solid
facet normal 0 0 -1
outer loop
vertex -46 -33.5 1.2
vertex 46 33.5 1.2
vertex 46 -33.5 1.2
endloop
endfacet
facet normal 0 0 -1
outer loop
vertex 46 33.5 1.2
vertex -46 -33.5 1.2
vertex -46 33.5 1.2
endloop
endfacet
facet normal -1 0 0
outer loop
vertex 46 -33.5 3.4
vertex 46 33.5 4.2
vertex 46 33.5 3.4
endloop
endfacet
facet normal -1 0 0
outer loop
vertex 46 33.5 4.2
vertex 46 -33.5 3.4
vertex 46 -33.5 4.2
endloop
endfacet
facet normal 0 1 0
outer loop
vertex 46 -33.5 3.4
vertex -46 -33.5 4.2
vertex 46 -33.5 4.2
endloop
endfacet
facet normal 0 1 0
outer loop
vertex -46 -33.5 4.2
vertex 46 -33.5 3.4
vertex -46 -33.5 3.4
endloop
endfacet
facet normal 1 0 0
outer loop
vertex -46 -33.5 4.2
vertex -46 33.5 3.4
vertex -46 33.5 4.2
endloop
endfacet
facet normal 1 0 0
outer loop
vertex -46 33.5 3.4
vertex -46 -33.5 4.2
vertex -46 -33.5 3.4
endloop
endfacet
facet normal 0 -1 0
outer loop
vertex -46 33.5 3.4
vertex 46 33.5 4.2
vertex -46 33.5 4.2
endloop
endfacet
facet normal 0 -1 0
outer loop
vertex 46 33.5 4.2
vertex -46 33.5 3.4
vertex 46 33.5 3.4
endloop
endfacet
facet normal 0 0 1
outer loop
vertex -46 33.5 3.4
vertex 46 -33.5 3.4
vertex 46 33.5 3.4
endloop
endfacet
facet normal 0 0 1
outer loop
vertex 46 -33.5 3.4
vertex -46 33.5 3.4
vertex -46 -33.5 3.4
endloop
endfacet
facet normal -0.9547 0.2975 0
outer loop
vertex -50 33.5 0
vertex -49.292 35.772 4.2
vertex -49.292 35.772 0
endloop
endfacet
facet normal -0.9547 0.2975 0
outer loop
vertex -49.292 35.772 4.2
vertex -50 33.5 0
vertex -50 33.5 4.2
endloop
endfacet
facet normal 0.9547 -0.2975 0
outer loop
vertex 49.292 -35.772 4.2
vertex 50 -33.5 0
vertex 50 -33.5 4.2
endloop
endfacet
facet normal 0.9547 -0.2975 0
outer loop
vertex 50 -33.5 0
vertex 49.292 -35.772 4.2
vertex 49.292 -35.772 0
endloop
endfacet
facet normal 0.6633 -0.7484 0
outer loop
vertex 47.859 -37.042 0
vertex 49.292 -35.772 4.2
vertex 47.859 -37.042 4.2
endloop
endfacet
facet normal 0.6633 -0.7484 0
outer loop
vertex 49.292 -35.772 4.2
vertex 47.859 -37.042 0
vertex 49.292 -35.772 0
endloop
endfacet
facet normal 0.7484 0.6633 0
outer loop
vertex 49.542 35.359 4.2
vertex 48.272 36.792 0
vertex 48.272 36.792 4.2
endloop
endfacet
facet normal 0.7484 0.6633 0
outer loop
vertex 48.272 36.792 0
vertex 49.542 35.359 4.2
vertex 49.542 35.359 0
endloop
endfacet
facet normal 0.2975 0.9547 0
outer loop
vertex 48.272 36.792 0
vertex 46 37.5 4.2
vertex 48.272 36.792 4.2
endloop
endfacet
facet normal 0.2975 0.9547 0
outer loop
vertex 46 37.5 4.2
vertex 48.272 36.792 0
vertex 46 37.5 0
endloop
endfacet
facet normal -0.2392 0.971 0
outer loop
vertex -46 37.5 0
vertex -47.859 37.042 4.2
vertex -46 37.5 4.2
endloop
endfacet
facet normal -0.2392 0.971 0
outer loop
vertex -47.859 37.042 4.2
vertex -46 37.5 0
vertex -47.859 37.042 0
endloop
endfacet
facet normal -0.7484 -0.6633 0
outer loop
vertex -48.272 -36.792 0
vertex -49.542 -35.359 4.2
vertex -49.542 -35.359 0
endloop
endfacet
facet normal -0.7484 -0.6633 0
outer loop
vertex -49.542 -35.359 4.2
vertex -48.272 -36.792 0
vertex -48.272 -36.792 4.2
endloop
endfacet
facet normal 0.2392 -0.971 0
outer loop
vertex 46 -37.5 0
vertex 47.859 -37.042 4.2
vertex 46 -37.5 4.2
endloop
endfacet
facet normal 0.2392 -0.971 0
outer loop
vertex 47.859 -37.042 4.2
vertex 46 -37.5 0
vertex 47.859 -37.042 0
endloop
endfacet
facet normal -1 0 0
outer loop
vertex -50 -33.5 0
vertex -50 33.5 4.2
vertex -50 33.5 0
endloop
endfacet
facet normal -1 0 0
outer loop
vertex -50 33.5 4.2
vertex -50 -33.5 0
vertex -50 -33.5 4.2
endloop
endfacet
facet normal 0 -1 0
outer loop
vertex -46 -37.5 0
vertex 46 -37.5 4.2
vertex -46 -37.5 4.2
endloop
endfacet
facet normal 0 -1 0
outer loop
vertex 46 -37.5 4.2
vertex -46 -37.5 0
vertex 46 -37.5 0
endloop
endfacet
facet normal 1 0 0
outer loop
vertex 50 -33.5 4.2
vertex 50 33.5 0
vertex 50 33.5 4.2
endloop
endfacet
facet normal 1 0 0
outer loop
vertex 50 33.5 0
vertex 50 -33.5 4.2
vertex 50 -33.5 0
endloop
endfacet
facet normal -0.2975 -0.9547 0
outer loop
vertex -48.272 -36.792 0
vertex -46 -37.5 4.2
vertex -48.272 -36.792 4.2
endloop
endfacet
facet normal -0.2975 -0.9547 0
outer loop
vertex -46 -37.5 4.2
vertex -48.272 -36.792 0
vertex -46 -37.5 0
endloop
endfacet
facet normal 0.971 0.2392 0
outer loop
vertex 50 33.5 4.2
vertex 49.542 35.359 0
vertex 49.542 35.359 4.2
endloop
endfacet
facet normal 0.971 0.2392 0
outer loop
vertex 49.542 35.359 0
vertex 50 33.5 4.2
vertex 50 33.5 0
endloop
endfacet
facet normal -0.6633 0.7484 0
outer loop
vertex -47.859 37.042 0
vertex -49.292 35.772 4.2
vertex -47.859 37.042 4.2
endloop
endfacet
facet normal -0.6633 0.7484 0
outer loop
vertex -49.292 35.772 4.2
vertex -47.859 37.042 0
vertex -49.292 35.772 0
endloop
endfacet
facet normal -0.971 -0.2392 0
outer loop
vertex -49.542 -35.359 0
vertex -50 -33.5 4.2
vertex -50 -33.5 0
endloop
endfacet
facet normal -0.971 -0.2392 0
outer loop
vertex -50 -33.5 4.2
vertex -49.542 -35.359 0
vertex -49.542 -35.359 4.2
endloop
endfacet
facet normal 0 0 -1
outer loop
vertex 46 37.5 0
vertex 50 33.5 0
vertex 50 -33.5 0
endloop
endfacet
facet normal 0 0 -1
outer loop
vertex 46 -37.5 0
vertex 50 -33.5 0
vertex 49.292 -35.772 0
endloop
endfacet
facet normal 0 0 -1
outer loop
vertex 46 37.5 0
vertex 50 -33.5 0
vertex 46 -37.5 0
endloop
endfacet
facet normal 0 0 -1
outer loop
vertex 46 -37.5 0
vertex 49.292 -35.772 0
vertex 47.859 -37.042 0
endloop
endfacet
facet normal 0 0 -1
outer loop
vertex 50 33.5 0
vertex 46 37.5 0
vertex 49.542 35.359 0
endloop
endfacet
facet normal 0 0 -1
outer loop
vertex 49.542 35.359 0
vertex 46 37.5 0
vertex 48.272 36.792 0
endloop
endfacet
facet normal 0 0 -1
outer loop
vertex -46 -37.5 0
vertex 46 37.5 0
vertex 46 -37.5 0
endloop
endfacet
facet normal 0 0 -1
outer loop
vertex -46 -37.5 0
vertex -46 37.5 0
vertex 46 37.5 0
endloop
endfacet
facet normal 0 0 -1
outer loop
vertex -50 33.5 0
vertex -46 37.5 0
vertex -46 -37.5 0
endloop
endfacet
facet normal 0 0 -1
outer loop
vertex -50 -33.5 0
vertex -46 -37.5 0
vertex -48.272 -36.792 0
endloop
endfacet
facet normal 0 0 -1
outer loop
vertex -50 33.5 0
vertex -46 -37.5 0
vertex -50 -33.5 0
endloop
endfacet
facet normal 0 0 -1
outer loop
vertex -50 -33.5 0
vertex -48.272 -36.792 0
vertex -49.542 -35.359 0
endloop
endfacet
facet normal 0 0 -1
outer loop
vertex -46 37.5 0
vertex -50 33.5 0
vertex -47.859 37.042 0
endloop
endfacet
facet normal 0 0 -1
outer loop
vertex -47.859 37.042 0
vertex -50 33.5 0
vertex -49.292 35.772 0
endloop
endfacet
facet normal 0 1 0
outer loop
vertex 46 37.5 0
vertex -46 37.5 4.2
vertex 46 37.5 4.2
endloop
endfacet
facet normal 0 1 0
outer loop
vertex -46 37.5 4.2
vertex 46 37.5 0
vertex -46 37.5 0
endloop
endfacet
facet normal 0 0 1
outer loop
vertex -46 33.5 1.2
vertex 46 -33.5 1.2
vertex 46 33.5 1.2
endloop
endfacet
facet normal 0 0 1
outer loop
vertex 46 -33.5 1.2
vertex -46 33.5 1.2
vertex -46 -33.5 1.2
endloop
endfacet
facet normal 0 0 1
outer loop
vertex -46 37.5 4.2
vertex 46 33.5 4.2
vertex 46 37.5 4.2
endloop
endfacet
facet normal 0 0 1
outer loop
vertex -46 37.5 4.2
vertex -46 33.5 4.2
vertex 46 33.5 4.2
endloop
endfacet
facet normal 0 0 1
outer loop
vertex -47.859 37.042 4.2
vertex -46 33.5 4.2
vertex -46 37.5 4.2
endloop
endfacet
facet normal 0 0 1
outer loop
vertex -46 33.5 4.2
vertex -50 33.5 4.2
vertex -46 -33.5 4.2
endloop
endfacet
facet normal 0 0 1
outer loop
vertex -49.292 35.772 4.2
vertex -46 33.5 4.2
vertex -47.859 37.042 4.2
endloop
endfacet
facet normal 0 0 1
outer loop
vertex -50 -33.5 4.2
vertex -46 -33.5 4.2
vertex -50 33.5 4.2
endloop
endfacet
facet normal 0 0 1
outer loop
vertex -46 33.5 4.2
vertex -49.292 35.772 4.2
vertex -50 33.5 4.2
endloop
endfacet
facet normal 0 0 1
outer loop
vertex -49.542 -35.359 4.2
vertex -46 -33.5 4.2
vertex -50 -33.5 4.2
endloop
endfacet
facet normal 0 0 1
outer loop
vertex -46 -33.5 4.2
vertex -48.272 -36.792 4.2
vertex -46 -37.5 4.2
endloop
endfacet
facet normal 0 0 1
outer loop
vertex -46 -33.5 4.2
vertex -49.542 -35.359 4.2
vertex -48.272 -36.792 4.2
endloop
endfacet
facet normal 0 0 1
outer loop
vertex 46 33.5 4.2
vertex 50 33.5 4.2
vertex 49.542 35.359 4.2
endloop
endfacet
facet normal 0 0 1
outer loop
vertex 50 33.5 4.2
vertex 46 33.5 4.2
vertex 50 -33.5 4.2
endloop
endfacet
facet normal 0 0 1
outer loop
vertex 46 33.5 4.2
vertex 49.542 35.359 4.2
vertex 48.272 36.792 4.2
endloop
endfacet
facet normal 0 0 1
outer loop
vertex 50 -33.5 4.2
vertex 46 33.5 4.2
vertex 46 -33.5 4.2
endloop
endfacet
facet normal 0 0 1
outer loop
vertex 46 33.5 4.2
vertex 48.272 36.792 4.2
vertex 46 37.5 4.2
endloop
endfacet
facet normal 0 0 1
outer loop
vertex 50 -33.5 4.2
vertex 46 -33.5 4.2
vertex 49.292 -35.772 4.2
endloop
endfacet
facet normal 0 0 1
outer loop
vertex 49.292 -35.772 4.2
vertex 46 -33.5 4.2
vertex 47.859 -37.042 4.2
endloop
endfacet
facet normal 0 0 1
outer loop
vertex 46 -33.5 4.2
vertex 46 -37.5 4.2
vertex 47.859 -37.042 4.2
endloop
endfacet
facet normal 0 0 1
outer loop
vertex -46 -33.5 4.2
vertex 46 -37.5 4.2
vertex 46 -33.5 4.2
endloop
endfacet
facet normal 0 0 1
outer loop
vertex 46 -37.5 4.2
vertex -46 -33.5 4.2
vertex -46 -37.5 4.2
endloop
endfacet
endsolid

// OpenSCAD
// lithophane_rectangle/model.scad
// Rectangular lithophane photo frame with optional rounded corners.
// Print flat (Z=0 face on bed). Display against a backlight.

photo_path    = "";
photo_cols    = 200;
photo_rows    = 200;
plate_w       = 100;
plate_h       = 75;
min_thickness = 0.8;
max_thickness = 3.0;
frame_width   = 4;
corner_r      = 4;
base_height   = 1.2;

inner_w = plate_w - 2 * frame_width;
inner_h = plate_h - 2 * frame_width;
inner_r = max(0, corner_r - frame_width);

module rounded_rect(w, h, r) {
  rr = min(r, w/4, h/4);
  offset(r = rr) square([w - 2*rr, h - 2*rr], center = true);
}

module litho_fill() {
  intersection() {
    union() {
      linear_extrude(height = min_thickness)
        rounded_rect(inner_w, inner_h, inner_r);

      if (photo_path != "") {
        translate([0, 0, min_thickness])
          scale([inner_w / photo_cols,
                 inner_h / photo_rows,
                 (max_thickness - min_thickness) / 255.0])
            surface(file = photo_path, center = true, invert = false, convexity = 4);
      } else {
        linear_extrude(height = max_thickness - min_thickness)
          rounded_rect(inner_w, inner_h, inner_r);
      }
    }
    linear_extrude(height = max_thickness + 1)
      rounded_rect(inner_w, inner_h, inner_r);
  }
}

union() {
  // Base plate
  linear_extrude(height = base_height)
    rounded_rect(plate_w, plate_h, corner_r);

  // Frame ring
  translate([0, 0, base_height])
    linear_extrude(height = max_thickness)
      difference() {
        rounded_rect(plate_w, plate_h, corner_r);
        rounded_rect(inner_w, inner_h, inner_r);
      }

  // Lithophane fill
  translate([0, 0, base_height])
    litho_fill();
}
